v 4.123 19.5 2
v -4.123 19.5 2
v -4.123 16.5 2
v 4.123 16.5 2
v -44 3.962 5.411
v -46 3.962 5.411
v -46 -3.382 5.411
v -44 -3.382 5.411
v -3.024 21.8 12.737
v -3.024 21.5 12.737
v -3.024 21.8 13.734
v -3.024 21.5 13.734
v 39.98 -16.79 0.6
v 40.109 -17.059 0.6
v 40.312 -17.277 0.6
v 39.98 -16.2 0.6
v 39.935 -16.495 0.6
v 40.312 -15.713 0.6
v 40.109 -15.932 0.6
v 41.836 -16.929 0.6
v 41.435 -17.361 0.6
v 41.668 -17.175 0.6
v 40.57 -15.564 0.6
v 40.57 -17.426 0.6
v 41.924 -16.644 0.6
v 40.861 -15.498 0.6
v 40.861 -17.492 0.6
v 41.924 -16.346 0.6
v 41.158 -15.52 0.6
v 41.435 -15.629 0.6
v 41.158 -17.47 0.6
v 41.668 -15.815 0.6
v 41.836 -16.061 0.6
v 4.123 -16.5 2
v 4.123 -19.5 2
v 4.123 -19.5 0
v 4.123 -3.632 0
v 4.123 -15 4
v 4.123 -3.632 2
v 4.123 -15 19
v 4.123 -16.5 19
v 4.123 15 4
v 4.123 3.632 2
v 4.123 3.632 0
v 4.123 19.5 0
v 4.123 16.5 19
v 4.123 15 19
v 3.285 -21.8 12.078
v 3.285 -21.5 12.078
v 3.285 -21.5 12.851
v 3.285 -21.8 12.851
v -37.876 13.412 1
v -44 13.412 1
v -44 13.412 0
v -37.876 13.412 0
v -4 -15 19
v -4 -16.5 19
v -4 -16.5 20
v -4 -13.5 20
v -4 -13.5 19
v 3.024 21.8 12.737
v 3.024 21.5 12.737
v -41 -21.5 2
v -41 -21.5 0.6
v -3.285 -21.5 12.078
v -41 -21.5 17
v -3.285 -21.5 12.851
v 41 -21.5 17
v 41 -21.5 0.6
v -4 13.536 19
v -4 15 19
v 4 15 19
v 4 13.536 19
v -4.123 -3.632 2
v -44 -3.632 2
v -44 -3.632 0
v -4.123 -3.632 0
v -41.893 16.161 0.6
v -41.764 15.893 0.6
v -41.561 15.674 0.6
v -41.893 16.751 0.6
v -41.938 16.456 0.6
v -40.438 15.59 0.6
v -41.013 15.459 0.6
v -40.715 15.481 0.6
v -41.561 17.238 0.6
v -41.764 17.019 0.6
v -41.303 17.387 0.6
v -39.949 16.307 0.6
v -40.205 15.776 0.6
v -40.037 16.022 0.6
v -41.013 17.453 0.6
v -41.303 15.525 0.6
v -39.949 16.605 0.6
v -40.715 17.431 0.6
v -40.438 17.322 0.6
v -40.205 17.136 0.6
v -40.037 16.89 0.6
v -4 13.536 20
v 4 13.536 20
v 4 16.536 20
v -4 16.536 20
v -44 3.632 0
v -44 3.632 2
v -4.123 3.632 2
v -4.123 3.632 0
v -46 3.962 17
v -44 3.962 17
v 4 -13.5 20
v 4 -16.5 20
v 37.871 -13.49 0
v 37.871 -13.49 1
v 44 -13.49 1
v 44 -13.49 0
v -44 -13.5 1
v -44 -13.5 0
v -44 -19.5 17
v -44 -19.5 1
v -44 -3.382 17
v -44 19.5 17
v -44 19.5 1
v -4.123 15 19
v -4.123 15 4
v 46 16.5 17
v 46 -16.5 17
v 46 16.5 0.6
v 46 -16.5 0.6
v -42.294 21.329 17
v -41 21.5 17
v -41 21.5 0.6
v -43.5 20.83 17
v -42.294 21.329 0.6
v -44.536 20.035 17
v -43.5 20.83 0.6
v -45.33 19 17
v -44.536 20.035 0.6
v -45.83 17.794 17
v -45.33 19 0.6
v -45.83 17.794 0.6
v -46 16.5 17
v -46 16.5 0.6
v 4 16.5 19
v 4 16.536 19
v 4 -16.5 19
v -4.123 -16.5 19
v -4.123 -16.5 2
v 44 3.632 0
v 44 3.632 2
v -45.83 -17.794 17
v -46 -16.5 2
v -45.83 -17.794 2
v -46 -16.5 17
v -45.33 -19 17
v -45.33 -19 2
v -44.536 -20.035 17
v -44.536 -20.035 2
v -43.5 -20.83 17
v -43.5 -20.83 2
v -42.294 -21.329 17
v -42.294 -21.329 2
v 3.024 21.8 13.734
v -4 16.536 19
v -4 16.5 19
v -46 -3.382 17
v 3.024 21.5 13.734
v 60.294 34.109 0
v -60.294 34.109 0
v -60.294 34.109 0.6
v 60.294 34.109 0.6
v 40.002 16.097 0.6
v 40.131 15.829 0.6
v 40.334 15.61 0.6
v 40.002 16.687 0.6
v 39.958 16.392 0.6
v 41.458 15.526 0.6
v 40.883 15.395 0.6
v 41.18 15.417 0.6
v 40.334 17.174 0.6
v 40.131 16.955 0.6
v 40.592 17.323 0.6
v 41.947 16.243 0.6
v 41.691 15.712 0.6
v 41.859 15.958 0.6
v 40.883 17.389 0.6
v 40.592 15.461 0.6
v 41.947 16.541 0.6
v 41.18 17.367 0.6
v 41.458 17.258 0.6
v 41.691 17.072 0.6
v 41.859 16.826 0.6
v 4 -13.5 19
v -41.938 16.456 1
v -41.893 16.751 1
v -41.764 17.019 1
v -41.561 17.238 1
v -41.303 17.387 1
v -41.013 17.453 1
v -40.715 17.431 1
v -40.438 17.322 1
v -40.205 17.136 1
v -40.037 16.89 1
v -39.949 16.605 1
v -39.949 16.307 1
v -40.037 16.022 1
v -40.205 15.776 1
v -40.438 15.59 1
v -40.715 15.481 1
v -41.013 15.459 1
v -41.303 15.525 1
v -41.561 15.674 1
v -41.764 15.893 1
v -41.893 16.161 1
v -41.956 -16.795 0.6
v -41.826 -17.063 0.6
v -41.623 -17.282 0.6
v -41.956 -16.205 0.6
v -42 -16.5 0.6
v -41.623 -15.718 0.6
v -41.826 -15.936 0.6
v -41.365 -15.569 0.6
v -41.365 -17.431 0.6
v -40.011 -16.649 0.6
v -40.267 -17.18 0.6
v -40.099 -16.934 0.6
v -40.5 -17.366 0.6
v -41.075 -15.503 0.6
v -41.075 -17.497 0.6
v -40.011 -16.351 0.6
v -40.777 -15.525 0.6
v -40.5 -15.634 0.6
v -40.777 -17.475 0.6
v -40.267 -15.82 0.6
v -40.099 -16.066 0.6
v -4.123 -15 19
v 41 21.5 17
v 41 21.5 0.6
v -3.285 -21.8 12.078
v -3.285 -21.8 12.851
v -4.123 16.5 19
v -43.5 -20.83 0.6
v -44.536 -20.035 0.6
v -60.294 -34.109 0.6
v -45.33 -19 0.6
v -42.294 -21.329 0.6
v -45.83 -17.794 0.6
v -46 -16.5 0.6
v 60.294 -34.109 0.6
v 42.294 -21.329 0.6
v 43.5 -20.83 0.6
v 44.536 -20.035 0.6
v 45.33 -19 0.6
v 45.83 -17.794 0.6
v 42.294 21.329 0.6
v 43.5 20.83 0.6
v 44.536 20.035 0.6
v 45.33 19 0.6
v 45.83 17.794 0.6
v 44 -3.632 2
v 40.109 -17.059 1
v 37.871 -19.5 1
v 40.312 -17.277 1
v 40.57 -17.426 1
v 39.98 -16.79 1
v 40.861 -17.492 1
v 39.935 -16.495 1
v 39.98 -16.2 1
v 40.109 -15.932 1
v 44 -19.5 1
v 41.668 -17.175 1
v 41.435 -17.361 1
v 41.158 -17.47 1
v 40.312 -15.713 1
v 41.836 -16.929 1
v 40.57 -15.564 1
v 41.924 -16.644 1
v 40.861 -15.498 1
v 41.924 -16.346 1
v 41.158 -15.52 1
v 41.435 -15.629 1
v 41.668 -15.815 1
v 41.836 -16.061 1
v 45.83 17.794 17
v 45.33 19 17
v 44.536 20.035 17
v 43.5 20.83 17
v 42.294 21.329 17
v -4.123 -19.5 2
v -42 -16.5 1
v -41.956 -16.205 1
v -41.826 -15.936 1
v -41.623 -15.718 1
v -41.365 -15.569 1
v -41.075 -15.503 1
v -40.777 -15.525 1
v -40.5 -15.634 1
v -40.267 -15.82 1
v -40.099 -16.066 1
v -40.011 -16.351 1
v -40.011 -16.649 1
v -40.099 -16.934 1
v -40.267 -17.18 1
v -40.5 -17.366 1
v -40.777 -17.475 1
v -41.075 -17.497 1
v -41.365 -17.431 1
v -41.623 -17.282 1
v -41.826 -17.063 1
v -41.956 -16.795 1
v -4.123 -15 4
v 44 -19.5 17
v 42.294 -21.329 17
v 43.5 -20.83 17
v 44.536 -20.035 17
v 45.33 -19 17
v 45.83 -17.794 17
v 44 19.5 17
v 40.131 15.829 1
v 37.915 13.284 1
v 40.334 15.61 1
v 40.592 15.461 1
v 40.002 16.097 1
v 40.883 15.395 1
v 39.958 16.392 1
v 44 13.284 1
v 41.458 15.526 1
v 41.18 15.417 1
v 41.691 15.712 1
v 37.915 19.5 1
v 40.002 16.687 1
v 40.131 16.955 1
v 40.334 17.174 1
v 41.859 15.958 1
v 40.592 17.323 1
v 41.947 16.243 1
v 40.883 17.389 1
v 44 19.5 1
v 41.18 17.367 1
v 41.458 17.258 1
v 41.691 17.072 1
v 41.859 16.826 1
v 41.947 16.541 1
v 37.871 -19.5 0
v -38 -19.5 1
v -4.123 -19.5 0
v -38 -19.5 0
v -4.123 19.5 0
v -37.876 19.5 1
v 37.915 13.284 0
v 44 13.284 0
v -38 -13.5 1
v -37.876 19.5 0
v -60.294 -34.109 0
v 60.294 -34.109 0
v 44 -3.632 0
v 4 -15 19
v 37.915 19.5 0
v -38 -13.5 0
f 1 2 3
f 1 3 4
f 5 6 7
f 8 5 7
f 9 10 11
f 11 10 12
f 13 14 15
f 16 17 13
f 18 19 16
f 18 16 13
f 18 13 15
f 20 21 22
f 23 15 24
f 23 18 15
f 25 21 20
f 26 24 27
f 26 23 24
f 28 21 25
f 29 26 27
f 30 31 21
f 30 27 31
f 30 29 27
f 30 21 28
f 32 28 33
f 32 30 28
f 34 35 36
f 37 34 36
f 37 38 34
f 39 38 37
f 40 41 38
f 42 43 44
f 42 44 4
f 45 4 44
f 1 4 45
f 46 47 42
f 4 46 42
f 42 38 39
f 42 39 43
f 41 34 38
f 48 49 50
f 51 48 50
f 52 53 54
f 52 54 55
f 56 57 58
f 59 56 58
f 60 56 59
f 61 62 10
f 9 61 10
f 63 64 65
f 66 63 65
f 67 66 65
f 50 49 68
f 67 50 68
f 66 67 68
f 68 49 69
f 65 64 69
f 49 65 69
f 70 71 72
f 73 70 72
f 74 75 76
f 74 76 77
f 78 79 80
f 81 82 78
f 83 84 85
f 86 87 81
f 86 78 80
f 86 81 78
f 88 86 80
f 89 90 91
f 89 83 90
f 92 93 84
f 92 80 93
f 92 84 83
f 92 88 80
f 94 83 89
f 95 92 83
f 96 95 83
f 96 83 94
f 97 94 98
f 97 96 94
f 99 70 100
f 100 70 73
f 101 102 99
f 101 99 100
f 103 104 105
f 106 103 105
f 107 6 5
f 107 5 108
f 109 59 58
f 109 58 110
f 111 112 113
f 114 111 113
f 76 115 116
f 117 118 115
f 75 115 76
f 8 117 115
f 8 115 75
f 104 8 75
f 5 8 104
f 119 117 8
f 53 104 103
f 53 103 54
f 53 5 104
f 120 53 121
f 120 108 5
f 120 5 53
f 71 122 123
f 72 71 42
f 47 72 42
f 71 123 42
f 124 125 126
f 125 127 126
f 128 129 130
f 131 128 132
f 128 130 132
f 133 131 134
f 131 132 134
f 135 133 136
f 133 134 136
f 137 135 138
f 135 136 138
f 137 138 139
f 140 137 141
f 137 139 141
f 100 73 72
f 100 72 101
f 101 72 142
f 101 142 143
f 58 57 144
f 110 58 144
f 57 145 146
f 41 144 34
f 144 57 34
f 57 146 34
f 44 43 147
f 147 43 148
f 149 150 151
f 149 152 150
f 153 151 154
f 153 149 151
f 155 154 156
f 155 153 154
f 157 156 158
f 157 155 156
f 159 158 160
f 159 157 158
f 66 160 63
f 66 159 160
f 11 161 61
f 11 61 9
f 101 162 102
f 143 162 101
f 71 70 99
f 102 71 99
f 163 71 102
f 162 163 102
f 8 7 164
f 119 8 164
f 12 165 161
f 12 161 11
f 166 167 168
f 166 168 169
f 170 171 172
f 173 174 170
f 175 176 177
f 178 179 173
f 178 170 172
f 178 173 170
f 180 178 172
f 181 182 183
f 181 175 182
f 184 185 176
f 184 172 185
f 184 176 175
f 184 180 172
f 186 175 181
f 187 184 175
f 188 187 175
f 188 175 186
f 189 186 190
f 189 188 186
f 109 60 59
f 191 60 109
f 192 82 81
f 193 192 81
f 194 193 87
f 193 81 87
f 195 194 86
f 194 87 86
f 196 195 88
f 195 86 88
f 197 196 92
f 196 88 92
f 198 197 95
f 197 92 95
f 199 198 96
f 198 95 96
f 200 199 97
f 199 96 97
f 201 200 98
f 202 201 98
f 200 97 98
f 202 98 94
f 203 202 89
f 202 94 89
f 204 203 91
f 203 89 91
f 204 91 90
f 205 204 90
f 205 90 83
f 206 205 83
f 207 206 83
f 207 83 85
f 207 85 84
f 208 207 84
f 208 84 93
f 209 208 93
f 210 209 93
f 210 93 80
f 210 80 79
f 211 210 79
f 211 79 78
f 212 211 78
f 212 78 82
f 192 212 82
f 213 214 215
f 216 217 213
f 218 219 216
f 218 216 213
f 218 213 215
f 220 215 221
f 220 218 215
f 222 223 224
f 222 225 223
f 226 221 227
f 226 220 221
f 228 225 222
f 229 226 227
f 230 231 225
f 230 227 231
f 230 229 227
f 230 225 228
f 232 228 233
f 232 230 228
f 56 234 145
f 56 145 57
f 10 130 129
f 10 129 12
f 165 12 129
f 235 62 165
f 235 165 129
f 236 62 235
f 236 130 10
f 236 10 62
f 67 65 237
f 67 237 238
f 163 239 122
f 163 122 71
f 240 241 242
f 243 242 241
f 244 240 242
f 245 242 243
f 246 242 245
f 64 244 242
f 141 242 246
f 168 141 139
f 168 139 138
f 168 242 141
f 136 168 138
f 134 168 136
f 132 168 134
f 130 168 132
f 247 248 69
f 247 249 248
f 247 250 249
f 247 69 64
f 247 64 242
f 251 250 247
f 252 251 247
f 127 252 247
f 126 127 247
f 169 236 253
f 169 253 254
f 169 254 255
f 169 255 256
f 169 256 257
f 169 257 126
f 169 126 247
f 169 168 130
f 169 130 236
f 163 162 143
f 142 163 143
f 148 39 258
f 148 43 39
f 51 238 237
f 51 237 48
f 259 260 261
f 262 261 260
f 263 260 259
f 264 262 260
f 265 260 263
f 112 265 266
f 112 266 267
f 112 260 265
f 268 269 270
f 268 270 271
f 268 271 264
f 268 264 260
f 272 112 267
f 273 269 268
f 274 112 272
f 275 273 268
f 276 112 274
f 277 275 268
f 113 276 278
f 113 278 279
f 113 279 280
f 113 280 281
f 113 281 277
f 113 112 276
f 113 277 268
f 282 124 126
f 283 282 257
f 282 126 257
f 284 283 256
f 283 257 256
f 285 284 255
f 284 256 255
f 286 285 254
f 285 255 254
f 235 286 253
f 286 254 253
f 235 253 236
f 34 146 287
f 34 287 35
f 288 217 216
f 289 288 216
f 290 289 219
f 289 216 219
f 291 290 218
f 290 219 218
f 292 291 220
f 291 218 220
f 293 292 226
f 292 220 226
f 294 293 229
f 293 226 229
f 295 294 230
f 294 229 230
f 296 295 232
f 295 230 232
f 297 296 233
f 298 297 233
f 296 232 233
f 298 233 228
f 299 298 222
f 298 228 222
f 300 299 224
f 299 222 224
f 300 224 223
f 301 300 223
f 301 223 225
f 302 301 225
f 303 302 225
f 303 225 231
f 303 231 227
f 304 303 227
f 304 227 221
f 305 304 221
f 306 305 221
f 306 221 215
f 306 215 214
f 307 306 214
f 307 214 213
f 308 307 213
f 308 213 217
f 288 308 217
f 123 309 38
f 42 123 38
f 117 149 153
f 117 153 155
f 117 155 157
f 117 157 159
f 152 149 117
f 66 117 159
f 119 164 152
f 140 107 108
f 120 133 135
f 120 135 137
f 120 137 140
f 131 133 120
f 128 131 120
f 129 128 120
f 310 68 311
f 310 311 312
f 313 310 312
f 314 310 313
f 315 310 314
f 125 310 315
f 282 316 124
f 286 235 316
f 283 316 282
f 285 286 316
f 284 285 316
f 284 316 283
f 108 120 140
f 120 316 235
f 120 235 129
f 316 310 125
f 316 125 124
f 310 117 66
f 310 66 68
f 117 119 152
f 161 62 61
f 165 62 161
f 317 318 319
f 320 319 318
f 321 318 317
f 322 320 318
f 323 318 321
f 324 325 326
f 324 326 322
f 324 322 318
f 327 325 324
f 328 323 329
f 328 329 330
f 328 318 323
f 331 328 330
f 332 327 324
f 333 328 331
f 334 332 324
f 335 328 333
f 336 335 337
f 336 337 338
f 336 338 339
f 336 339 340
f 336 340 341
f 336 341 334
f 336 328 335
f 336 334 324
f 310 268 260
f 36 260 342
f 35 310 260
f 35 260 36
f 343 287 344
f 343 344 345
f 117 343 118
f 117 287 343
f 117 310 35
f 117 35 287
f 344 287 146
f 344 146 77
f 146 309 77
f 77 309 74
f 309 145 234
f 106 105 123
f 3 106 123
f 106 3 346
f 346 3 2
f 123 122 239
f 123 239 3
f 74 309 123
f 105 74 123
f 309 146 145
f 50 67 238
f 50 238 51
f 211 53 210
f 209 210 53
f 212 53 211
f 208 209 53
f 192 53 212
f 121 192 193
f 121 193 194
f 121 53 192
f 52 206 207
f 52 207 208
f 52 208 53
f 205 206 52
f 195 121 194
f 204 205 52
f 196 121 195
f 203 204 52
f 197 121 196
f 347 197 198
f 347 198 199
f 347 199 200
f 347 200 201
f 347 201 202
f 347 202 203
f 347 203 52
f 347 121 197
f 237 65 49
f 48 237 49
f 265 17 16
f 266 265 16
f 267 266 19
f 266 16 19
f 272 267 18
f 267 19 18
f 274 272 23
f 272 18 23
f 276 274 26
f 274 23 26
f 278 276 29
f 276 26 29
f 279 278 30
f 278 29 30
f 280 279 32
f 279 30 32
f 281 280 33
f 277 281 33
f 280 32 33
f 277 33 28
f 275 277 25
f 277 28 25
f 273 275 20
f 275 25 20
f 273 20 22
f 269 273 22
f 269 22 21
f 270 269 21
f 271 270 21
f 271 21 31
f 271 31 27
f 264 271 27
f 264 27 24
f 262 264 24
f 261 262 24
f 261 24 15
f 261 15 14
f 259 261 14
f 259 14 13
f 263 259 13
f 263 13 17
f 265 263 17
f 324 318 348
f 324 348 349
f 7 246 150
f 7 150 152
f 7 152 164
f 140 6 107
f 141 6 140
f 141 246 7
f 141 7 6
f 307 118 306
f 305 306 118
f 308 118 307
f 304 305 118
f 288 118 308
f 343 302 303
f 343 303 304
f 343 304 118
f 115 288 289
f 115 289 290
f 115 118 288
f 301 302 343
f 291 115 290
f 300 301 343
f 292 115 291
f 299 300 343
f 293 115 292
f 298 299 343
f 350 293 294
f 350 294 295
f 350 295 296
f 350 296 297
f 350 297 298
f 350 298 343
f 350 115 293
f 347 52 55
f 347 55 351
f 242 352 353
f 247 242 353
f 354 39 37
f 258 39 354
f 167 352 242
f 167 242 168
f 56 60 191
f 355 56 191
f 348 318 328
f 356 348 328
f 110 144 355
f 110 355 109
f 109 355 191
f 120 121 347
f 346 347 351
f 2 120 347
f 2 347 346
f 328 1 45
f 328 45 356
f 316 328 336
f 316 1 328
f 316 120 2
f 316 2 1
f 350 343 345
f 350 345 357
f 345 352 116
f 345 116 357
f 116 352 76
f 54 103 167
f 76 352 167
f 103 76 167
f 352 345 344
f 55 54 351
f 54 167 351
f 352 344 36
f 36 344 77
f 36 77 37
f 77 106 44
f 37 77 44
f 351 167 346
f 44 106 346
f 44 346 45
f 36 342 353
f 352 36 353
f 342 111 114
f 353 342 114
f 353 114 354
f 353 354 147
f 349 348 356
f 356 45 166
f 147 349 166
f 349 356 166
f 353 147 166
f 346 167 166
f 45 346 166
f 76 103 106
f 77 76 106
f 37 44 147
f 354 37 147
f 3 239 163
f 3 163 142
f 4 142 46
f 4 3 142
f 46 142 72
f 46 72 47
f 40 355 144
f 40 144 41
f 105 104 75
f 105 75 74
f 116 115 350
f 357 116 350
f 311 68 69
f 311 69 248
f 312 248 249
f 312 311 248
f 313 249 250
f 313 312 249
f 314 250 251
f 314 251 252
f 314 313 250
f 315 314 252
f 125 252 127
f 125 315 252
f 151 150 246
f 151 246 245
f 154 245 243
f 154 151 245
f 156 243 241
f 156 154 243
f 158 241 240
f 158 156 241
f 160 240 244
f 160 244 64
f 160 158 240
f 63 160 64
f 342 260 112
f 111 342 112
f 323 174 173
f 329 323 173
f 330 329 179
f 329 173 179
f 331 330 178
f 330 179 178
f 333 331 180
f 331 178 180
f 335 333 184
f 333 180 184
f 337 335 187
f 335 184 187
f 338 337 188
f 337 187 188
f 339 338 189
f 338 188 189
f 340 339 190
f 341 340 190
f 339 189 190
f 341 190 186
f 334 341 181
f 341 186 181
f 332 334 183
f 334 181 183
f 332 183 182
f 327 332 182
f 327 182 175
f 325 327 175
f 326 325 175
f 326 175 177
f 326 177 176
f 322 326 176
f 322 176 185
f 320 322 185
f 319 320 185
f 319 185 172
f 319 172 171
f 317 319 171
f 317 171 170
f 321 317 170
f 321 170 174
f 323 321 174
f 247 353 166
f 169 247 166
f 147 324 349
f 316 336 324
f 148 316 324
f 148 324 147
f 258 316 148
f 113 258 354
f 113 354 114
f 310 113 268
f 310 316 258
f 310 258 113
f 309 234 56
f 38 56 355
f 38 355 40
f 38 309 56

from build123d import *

# Parameters (mm, degrees)
F0_W      = 92
F0_H      = 42.9992415011
F0_W_2    = 39.8767858334
F0_H_2    = 7.2647114284
F0_W_3    = 8.2464283332
F0_H_3    = 15.8676442858
F1_DEPTH  = 2
F2_W      = 8.2464283332
F2_H      = 1.5
F3_DEPTH  = 17
F4_DEPTH  = 17
F6_DEPTH  = 2
F7_W      = 8
F7_H      = 3
F8_DEPTH  = 1
F10_W     = 8
F10_H     = 8
F11_DEPTH = 1
F9_W      = 8
F9_H      = 8
F12_DEPTH = 1
F13_W     = 8
F13_H     = 8
F14_DEPTH = 1
F15_W     = 8
F15_H     = 8
F16_DEPTH = 1
F17_W     = 92
F17_H     = 42.9992415011
F18_DEPTH = 15
F20_D     = 2
F20_DEPTH = 12
F20_TIP   = 0.600860619
F22_D     = 2
F22_DEPTH = 12
F22_TIP   = 0.600860619
F24_D     = 2
F24_DEPTH = 12
F24_TIP   = 0.600860619
F26_D     = 2
F26_DEPTH = 12
F26_TIP   = 0.600860619
F27_W     = 7.3435585946
F27_H     = 11.5889557712
F28_DEPTH = 3
F29_W     = 6.5705534071
F29_H     = 0.7730051875
F30_DEPTH = 0.3
F31_W     = 6.048291456
F31_H     = 0.9969957173
F32_DEPTH = 0.3
F33_R     = 5
F34_R     = 5
F35_R     = 5
F36_R     = 5
F37_W     = 120.588965714
F37_H     = 68.2177916169
F38_DEPTH = 0.6
F39_DEPTH = 25


with BuildPart() as f1:
    # F0 (on Top) → F1 (new body)
    with BuildSketch(Plane.XY):
        Rectangle(F0_W, F0_H)
        Polygon((-44, 3.6323557142), (-44, 19.5), (-4.1232141666, 19.5), (4.1232141666, 19.5), (44, 19.5), (44, 3.6323557142), (44, -3.6323557142), (44, -19.5), (4.1232141666, -19.5), (-4.1232141666, -19.5), (-44, -19.5), (-44, -3.6323557142), align=None, mode=Mode.SUBTRACT)
        with Locations((-24.0616070833, 0)):
            Rectangle(F0_W_2, F0_H_2)
        with Locations((24.0616070833, 0)):
            Rectangle(F0_W_2, F0_H_2)
        with Locations((0, -11.5661778571)):
            Rectangle(F0_W_3, F0_H_3)
        with Locations((0, 11.5661778571)):
            Rectangle(F0_W_3, F0_H_3)
        Rectangle(F0_W_3, F0_H_2)
    extrude(amount=F1_DEPTH)

    # F2 (on face) → F3 (join)
    with BuildSketch(Plane.XY.offset(2)):
        with Locations((0, 15.75)):
            Rectangle(F2_W, F2_H)
    extrude(amount=F3_DEPTH)

    # F2 (on face) → F4 (join)
    with BuildSketch(Plane.XY.offset(2)):
        with Locations((0, -15.75)):
            Rectangle(F2_W, F2_H)
    extrude(amount=F4_DEPTH)

    # F5 (on face) → F6 (join)
    with BuildSketch(Plane.XY.offset(2)):
        Polygon((-4.1232141666, -3.6323557142), (-4.1232141666, -15), (4.1232141666, -15), (4.1232141666, -3.6323557142), (4.1232141666, 3.6323557142), (4.1232141666, 15), (-4.1232141666, 15), (-4.1232141666, 3.6323557142), align=None)
    extrude(amount=F6_DEPTH)

    # F7 (on face) → F8 (join)
    with BuildSketch(Plane.XY.offset(19)):
        with Locations((0, -15)):
            Rectangle(F7_W, F7_H)
        with Locations((0, 15.0357708335)):
            Rectangle(F7_W, F7_H)
    extrude(amount=F8_DEPTH)

    # F10 (on Top) → F11 (join)
    with BuildSketch(Plane.XY):
        with Locations((-41.8757377899, 17.4122615717)):
            Rectangle(F10_W, F10_H)
    extrude(amount=F11_DEPTH)

    # F9 (on Top) → F12 (join)
    with BuildSketch(Plane.XY):
        with Locations((-42, -17.4996207505)):
            Rectangle(F9_W, F9_H)
    extrude(amount=F12_DEPTH)

    # F13 (on Top) → F14 (join)
    with BuildSketch(Plane.XY):
        with Locations((41.91535397, 17.2840473242)):
            Rectangle(F13_W, F13_H)
    extrude(amount=F14_DEPTH)

    # F15 (on Top) → F16 (join)
    with BuildSketch(Plane.XY):
        with Locations((41.8707623184, -17.4904118329)):
            Rectangle(F15_W, F15_H)
    extrude(amount=F16_DEPTH)

    # F17 (on face) → F18 (join)
    with BuildSketch(Plane.XY.offset(2)):
        Rectangle(F17_W, F17_H)
        Polygon((4.1232141666, -19.5), (-4.1232141666, -19.5), (-44, -19.5), (-44, -3.6323557142), (-44, 3.6323557142), (-44, 19.5), (-4.1232141666, 19.5), (4.1232141666, 19.5), (44, 19.5), (44, 3.6323557142), (44, -3.6323557142), (44, -19.5), align=None, mode=Mode.SUBTRACT)
    extrude(amount=F18_DEPTH)

    # F20
    with Locations(Plane.XY.offset(1)):
        with Locations((-41, -16.4998103753)):
            Hole(F20_D / 2, depth=F20_DEPTH)
            with Locations((0, 0, -(F20_DEPTH + F20_TIP / 2))):  # 118° drill point
                Cone(0, F20_D / 2, F20_TIP, mode=Mode.SUBTRACT)

    # F22
    with Locations(Plane.XY.offset(1)):
        with Locations((-40.937868895, 16.4561307859)):
            Hole(F22_D / 2, depth=F22_DEPTH)
            with Locations((0, 0, -(F22_DEPTH + F22_TIP / 2))):  # 118° drill point
                Cone(0, F22_D / 2, F22_TIP, mode=Mode.SUBTRACT)

    # F24
    with Locations(Plane.XY.offset(1)):
        with Locations((40.957676985, 16.3920236621)):
            Hole(F24_D / 2, depth=F24_DEPTH)
            with Locations((0, 0, -(F24_DEPTH + F24_TIP / 2))):  # 118° drill point
                Cone(0, F24_D / 2, F24_TIP, mode=Mode.SUBTRACT)

    # F26
    with Locations(Plane.XY.offset(1)):
        with Locations((40.9353811592, -16.4952059165)):
            Hole(F26_D / 2, depth=F26_DEPTH)
            with Locations((0, 0, -(F26_DEPTH + F26_TIP / 2))):  # 118° drill point
                Cone(0, F26_D / 2, F26_TIP, mode=Mode.SUBTRACT)

    # F27 (on face) → F28 (cut)
    with BuildSketch(Plane(origin=(-46, 0, 0), x_dir=(0, -1, 0), z_dir=(-1, 0, 0))):
        with Locations((-0.289877411, 11.2055221144)):
            Rectangle(F27_W, F27_H)
    extrude(amount=-F28_DEPTH, mode=Mode.SUBTRACT)

    # F29 (on face) → F30 (join)
    with BuildSketch(Plane.XZ.offset(21.4996207505)):
        with Locations((0, 12.4647244811)):
            Rectangle(F29_W, F29_H)
    extrude(amount=F30_DEPTH)

    # F31 (on face) → F32 (join)
    with BuildSketch(Plane(origin=(0, 21.4996207505, 0), x_dir=(-1, 0, 0), z_dir=(0, 1, 0))):
        with Locations((0, 13.2352923974)):
            Rectangle(F31_W, F31_H)
    extrude(amount=F32_DEPTH)

    # F33
    f33_edges = [f1.edges().sort_by_distance(p)[0] for p in [
        (-46, -21.499621, 8.5),
    ]]
    fillet(f33_edges, radius=F33_R)

    # F34
    f34_edges = [f1.edges().sort_by_distance(p)[0] for p in [
        (46, -21.499621, 8.5),
    ]]
    fillet(f34_edges, radius=F34_R)

    # F35
    f35_edges = [f1.edges().sort_by_distance(p)[0] for p in [
        (46, 21.499621, 8.5),
    ]]
    fillet(f35_edges, radius=F35_R)

    # F36
    f36_edges = [f1.edges().sort_by_distance(p)[0] for p in [
        (-46, 21.499621, 8.5),
    ]]
    fillet(f36_edges, radius=F36_R)

    # F37 (on Top) → F38 (join)
    with BuildSketch(Plane.XY):
        Rectangle(F37_W, F37_H)
    extrude(amount=F38_DEPTH)

    # F39 (cut): faces of the model
    f39_faces = [f1.faces().sort_by_distance(p)[0] for p in [
        (-23.0397011823, -11.2685281209, 0.6),
        (-23.0049653202, 11.2600123957, 0.6),
        (22.9874600432, 11.2593805949, 0.6),
        (23.0186221767, -11.261509687, 0.6),
    ]]
    extrude(f39_faces, amount=-F39_DEPTH, mode=Mode.SUBTRACT)


solid = f1.part
